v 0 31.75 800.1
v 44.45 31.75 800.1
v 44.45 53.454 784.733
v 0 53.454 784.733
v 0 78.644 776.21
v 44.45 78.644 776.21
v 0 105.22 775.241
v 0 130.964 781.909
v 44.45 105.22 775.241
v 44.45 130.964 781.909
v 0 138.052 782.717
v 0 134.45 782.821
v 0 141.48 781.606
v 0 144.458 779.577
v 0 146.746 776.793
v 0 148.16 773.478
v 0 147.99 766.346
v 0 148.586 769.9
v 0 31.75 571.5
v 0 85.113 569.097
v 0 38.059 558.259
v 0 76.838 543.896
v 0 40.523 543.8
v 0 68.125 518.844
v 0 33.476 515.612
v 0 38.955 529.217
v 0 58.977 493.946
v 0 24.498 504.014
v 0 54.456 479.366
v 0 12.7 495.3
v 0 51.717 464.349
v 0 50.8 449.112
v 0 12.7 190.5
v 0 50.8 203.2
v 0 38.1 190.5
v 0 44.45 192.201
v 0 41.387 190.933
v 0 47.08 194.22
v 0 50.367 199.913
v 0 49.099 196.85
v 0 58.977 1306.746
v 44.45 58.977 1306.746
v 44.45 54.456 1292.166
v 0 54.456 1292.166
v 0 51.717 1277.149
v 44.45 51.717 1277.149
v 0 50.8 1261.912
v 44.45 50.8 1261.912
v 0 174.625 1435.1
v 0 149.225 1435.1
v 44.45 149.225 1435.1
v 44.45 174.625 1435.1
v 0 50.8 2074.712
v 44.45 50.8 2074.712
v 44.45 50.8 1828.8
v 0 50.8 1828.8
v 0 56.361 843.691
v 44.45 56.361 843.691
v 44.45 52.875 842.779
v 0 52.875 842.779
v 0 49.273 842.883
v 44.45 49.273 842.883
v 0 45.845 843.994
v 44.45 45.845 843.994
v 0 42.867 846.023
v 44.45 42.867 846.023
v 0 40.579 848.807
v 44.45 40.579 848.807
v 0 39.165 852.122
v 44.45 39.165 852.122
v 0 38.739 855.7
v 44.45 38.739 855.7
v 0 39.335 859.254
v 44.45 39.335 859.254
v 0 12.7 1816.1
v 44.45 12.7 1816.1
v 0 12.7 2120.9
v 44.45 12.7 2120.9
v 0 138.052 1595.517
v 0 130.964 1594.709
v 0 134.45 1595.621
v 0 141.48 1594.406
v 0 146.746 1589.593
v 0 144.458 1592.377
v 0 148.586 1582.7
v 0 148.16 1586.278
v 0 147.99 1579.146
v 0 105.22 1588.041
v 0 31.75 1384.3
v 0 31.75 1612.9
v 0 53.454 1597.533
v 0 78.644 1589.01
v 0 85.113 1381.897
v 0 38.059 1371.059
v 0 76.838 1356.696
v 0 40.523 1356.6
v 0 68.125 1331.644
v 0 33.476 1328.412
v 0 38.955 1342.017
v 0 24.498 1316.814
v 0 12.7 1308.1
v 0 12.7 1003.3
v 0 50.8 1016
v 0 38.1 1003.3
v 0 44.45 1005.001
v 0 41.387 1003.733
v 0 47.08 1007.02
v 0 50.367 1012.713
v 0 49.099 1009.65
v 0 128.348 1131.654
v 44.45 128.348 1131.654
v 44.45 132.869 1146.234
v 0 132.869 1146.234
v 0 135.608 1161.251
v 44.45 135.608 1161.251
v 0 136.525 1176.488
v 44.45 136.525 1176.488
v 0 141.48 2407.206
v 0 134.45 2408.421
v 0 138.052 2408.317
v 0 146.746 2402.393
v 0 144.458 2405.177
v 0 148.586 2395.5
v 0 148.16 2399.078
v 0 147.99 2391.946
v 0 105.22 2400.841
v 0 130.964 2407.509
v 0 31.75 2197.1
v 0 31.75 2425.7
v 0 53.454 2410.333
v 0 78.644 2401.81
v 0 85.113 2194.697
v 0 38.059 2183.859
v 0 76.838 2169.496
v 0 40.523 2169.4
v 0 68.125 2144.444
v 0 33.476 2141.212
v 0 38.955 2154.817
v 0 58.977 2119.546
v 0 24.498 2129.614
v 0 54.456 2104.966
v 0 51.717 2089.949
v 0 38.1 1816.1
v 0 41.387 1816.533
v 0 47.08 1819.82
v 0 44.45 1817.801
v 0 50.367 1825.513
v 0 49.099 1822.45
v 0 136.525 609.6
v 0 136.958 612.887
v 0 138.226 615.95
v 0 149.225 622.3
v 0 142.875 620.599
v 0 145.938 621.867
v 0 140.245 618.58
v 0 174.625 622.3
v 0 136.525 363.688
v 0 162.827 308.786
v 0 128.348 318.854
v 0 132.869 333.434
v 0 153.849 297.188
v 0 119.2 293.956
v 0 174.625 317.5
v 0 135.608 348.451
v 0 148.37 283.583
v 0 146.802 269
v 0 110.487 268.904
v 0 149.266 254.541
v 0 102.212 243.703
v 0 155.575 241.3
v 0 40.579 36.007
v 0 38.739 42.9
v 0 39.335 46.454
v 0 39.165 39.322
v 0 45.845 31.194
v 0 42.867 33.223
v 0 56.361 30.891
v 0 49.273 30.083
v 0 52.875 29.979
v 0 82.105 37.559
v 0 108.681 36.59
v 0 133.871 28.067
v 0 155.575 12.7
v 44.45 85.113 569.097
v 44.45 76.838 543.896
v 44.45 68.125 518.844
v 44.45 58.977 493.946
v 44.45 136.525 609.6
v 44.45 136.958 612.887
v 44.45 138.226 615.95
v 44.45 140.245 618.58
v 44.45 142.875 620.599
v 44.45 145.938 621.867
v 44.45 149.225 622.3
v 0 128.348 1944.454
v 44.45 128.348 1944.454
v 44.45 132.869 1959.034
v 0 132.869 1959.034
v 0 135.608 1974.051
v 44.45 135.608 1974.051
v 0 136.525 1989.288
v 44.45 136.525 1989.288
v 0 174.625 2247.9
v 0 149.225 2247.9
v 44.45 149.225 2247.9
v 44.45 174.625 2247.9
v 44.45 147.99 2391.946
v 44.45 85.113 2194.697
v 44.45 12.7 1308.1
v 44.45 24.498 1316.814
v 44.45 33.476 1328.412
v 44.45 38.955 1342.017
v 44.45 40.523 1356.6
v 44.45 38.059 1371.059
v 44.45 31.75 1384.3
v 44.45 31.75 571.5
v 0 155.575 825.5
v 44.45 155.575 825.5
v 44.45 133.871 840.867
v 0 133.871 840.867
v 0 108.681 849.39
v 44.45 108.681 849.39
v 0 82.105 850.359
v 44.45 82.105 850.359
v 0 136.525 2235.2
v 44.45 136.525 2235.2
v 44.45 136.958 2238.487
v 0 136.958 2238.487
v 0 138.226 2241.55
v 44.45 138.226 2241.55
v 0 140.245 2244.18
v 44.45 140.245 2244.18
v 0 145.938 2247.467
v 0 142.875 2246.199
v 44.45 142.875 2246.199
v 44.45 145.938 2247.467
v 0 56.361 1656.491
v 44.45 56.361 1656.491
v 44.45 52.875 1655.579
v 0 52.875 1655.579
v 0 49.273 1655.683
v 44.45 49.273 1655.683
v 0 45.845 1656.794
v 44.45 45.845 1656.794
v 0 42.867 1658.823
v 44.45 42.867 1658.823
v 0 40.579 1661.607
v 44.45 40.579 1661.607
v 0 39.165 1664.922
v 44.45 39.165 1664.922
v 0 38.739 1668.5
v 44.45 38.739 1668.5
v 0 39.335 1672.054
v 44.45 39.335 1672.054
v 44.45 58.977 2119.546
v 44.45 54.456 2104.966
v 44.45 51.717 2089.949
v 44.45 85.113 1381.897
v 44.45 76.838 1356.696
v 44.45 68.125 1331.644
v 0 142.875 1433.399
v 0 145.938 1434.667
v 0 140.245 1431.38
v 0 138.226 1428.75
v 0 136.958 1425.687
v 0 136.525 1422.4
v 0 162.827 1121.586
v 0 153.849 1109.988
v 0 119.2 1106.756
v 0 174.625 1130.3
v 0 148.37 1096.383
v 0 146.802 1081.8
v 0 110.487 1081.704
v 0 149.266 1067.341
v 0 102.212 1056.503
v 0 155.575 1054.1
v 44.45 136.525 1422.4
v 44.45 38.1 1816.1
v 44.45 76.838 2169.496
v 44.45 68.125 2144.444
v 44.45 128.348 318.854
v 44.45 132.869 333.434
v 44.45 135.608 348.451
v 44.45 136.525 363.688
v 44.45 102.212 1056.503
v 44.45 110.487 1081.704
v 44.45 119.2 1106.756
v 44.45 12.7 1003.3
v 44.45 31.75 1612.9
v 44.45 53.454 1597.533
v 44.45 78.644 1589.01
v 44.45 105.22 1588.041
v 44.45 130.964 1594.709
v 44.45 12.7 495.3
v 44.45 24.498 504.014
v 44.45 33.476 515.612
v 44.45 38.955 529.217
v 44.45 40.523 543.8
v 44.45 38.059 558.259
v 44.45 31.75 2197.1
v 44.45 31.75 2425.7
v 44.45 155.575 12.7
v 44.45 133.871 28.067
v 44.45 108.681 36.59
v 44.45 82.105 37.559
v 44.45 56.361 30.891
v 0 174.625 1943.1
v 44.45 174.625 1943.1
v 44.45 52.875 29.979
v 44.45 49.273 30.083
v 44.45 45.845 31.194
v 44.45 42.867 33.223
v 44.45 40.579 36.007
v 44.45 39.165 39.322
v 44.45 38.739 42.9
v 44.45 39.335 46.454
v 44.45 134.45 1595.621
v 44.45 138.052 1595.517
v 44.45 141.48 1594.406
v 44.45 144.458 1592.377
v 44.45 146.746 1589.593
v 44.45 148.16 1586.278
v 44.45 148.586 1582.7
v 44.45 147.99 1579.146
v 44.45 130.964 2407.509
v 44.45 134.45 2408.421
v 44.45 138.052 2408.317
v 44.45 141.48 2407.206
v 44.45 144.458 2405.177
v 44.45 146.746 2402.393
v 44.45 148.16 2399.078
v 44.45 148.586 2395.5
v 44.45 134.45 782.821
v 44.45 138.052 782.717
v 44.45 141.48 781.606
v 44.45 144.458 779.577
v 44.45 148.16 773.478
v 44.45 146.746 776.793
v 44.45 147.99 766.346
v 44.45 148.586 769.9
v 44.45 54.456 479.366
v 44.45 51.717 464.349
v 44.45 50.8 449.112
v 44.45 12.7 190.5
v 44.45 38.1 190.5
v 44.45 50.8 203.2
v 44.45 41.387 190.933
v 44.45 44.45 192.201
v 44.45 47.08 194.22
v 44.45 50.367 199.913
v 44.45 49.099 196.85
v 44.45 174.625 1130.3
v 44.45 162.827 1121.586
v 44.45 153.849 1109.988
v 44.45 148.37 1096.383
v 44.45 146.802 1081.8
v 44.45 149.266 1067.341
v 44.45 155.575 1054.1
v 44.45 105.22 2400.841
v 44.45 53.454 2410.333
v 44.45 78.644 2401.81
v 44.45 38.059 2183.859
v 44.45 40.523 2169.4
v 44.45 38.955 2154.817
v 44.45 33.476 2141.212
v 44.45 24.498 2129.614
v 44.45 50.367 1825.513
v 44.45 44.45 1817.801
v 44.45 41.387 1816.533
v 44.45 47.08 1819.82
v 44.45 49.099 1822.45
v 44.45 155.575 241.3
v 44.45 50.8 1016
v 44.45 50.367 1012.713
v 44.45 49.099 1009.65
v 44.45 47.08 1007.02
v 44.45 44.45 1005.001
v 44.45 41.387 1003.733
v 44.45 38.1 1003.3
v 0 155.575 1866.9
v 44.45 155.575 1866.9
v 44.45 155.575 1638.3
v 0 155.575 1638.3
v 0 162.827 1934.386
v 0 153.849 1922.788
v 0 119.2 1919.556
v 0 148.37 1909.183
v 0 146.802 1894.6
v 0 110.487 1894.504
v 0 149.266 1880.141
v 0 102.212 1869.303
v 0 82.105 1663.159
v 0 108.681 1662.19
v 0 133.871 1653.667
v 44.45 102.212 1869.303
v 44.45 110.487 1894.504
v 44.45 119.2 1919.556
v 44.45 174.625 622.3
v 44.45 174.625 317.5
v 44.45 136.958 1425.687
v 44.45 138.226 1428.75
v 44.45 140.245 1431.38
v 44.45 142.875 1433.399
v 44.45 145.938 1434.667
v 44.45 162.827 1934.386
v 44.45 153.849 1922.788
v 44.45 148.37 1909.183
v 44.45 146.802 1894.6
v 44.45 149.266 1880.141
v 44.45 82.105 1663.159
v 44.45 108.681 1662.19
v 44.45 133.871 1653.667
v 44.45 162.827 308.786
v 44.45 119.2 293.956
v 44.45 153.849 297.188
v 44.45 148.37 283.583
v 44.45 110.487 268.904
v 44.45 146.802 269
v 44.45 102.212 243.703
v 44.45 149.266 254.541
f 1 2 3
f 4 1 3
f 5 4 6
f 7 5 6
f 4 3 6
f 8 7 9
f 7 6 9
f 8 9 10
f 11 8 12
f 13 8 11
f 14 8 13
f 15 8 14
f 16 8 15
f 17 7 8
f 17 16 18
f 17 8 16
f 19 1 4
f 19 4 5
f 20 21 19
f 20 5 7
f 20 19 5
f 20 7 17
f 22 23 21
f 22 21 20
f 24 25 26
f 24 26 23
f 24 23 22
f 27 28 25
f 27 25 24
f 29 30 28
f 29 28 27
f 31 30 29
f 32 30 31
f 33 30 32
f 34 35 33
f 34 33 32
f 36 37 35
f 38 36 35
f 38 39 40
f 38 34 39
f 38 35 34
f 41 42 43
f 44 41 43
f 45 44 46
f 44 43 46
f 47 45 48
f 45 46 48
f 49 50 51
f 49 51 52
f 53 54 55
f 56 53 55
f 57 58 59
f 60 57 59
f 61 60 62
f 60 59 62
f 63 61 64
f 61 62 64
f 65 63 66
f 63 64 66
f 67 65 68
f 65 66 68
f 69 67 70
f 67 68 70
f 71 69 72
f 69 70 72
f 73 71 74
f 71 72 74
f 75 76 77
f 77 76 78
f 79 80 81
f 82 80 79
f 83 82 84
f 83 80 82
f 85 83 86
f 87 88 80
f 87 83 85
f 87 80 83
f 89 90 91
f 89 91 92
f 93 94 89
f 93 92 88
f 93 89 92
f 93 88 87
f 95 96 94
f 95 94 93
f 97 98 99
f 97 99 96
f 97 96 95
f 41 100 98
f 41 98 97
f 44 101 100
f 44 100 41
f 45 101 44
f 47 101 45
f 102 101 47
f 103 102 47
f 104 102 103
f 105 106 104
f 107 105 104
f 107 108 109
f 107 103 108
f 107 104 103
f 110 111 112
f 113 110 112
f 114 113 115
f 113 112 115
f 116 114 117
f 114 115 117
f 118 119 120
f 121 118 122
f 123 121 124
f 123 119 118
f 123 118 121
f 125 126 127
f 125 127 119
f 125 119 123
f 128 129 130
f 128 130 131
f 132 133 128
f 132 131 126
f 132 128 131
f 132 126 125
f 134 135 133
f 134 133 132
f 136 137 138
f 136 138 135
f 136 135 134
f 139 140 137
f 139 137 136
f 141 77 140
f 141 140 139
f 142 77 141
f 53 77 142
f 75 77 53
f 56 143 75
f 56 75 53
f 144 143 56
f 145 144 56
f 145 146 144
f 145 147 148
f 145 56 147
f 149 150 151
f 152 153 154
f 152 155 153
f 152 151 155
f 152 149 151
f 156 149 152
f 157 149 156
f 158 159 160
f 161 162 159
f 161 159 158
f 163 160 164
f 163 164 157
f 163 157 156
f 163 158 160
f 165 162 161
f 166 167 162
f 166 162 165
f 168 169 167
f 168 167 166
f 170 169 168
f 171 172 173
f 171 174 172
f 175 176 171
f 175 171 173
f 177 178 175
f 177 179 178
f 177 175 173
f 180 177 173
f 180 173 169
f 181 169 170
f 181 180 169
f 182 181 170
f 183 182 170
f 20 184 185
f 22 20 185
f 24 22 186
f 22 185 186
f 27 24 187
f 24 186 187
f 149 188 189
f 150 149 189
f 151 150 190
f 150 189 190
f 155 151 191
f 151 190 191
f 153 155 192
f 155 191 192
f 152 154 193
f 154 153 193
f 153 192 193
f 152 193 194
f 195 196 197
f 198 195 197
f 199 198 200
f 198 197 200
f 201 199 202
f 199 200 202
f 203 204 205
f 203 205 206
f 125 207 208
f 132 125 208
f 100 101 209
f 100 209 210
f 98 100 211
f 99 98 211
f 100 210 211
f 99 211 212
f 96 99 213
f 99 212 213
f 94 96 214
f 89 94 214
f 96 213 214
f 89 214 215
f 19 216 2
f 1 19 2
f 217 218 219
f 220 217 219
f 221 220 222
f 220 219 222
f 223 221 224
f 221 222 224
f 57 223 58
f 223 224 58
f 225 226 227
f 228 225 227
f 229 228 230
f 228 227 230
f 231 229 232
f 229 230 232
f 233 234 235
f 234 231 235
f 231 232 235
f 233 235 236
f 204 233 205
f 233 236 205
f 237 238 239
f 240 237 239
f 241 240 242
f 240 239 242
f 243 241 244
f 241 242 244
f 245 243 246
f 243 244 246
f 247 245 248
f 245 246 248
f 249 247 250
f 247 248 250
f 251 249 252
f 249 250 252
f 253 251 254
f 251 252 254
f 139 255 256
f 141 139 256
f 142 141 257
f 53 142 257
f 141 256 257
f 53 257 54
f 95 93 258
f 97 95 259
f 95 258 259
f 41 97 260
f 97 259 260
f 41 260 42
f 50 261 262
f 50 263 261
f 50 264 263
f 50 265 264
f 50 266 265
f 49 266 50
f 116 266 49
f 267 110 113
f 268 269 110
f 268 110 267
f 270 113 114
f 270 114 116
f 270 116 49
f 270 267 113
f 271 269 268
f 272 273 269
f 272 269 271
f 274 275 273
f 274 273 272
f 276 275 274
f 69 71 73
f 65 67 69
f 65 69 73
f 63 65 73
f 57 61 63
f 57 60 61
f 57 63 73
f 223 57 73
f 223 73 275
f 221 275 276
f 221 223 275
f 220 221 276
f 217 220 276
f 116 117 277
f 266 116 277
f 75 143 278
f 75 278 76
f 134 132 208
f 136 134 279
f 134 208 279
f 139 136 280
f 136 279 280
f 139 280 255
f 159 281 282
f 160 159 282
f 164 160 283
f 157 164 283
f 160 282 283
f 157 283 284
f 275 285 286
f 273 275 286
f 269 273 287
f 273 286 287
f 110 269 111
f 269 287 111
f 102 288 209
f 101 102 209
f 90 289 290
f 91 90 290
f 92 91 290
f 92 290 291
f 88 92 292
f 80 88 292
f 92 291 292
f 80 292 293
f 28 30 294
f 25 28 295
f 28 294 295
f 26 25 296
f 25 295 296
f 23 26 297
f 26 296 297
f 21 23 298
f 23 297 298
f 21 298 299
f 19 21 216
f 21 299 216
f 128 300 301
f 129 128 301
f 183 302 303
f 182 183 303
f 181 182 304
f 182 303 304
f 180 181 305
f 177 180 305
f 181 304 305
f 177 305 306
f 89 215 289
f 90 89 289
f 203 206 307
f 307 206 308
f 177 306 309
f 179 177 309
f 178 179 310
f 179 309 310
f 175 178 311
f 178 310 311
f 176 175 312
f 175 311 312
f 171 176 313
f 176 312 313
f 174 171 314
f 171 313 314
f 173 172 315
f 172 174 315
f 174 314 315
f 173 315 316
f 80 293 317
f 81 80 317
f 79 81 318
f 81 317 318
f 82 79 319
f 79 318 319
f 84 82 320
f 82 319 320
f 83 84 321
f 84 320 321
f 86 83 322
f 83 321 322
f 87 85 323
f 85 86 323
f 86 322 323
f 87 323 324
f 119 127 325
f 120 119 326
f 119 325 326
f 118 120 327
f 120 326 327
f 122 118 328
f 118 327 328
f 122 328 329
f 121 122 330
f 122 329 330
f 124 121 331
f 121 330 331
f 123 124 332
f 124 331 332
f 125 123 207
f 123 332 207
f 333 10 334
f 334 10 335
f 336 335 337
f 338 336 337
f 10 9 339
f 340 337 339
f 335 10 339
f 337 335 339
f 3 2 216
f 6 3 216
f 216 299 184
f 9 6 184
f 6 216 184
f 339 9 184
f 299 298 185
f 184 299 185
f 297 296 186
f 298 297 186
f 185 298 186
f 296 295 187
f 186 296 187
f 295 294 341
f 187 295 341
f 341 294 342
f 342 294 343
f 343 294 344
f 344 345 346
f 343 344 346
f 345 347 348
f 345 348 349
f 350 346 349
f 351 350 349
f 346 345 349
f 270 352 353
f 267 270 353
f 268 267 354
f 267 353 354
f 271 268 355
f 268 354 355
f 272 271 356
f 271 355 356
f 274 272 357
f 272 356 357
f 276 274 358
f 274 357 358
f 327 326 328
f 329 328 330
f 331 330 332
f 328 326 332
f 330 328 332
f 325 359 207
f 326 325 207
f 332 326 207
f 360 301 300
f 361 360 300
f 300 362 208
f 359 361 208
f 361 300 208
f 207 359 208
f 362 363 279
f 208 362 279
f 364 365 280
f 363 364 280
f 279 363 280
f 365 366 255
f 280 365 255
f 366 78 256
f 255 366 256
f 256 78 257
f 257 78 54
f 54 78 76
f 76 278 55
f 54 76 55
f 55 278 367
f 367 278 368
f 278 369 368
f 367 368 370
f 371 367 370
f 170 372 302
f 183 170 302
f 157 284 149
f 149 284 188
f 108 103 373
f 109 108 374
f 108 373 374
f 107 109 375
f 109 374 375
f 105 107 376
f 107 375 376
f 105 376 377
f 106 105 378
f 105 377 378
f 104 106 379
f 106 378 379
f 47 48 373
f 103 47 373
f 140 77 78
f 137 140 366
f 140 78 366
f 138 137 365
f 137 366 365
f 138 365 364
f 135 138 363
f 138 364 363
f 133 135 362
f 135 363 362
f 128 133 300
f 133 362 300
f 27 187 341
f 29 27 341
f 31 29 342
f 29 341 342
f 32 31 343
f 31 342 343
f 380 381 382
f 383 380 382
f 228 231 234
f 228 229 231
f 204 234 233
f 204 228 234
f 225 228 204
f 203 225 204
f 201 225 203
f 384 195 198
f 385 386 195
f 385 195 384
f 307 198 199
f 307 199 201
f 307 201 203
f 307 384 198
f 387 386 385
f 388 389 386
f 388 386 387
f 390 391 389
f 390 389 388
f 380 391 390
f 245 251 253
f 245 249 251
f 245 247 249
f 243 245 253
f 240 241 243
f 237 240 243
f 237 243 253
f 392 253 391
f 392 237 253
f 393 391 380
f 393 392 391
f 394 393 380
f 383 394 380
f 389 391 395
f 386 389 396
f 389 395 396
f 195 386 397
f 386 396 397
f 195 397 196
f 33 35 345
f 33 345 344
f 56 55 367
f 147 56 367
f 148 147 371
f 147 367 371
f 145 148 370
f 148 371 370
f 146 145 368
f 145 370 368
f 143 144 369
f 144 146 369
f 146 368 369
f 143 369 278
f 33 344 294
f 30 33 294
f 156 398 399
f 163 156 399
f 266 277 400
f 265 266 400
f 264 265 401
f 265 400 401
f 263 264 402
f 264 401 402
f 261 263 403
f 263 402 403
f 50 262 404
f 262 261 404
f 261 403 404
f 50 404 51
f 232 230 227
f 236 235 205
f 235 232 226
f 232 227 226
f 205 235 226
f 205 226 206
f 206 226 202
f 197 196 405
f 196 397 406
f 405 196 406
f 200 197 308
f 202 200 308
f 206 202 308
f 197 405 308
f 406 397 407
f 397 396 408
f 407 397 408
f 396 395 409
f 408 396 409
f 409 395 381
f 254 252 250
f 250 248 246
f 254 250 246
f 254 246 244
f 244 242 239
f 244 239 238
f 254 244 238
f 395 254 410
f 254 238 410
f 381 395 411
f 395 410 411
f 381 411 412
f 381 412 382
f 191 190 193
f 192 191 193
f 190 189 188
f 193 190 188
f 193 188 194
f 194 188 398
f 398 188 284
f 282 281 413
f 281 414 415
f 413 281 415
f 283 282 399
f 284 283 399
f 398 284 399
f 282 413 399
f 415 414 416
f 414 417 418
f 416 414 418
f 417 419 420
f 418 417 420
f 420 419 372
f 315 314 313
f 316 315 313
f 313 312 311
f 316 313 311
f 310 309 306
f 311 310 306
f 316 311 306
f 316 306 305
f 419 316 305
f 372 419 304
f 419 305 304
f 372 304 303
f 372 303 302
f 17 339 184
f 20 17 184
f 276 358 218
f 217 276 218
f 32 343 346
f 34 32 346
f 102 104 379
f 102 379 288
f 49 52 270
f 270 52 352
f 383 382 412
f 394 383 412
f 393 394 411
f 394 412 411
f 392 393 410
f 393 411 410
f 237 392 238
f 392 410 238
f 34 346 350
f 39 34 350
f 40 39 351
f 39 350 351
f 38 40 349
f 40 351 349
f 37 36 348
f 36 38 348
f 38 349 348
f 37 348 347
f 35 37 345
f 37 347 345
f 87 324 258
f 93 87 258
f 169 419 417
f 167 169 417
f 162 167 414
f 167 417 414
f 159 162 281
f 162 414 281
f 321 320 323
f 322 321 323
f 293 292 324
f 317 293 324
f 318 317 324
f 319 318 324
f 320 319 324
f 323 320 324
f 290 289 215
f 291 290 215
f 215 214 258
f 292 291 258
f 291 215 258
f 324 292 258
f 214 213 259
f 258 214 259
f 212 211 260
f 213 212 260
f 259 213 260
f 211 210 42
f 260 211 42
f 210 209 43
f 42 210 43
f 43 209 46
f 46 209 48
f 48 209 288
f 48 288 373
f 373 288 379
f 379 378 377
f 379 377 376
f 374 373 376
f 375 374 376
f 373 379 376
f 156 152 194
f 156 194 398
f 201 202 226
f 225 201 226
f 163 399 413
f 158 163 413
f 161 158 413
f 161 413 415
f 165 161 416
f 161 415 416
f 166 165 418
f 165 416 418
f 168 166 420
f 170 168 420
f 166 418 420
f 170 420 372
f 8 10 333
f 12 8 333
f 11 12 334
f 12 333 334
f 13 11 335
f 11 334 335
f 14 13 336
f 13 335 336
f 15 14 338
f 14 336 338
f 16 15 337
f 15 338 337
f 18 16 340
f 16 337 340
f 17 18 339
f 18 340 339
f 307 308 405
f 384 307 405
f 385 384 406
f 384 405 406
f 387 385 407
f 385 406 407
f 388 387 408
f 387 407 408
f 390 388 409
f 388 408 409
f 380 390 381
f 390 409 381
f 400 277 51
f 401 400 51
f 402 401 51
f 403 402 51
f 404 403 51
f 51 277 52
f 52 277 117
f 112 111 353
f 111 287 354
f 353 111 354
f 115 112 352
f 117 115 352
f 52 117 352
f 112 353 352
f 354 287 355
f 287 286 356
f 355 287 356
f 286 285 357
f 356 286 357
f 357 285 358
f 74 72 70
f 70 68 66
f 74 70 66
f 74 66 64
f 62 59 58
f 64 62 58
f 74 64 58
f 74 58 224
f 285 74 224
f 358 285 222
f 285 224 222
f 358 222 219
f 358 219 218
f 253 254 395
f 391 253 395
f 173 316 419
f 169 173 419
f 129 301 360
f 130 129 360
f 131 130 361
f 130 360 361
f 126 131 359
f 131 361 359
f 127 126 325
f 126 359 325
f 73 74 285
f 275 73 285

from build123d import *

# Parameters (mm, degrees)
F0_W     = 44.45
F0_H     = 184.15
F1_DEPTH = 2438.4
F2_W     = 184.15
F2_H     = 2438.4
F3_DEPTH = 44.451


with BuildPart() as f1:
    # F0 (on Top) → F1 (new body)
    with BuildSketch(Plane.XY):
        with Locations((22.225, 92.075)):
            Rectangle(F0_W, F0_H)
    extrude(amount=F1_DEPTH)

    # F2 (on face) → F3 (cut, through all)
    with BuildSketch(Plane.YZ.offset(44.45)):
        with Locations((92.075, 1219.2)):
            Rectangle(F2_W, F2_H)
        with BuildLine():
            Line((50.8, 449.111792), (50.8, 203.2))
            ThreePointArc((50.8, 203.2), (47.080256, 194.219744), (38.1, 190.5))
            Line((38.1, 190.5), (12.7, 190.5))
            Line((12.7, 190.5), (12.7, 495.3))
            ThreePointArc((12.7, 495.3), (38.955498, 529.217376), (31.75, 571.5))
            Line((31.75, 571.5), (31.75, 800.1))
            ThreePointArc((31.75, 800.1), (78.644314, 776.209793), (130.963939, 781.908516))
            ThreePointArc((130.963939, 781.908516), (144.458401, 779.576827), (147.990097, 766.345637))
            Line((147.990097, 766.345637), (85.113103, 569.097312))
            ThreePointArc((85.113103, 569.097312), (72.5356, 531.351046), (58.977038, 493.945971))
            ThreePointArc((58.977038, 493.945971), (52.860982, 471.898672), (50.8, 449.111792))
        make_face(mode=Mode.SUBTRACT)
        with BuildLine():
            Line((149.225, 622.3), (174.625, 622.3))
            Line((174.625, 622.3), (174.625, 317.5))
            ThreePointArc((174.625, 317.5), (148.369502, 283.582624), (155.575, 241.3))
            Line((155.575, 241.3), (155.575, 12.7))
            ThreePointArc((155.575, 12.7), (108.680686, 36.590207), (56.361061, 30.891484))
            ThreePointArc((56.361061, 30.891484), (42.866599, 33.223173), (39.334903, 46.454363))
            Line((39.334903, 46.454363), (102.211897, 243.702688))
            ThreePointArc((102.211897, 243.702688), (114.7894, 281.448954), (128.347962, 318.854029))
            ThreePointArc((128.347962, 318.854029), (134.464018, 340.901328), (136.525, 363.688208))
            Line((136.525, 363.688208), (136.525, 609.6))
            ThreePointArc((136.525, 609.6), (140.244744, 618.580256), (149.225, 622.3))
        make_face(mode=Mode.SUBTRACT)
        with BuildLine():
            Line((136.525, 1176.488208), (136.525, 1422.4))
            ThreePointArc((136.525, 1422.4), (140.244744, 1431.380256), (149.225, 1435.1))
            Line((149.225, 1435.1), (174.625, 1435.1))
            Line((174.625, 1435.1), (174.625, 1130.3))
            ThreePointArc((174.625, 1130.3), (148.369502, 1096.382624), (155.575, 1054.1))
            Line((155.575, 1054.1), (155.575, 825.5))
            ThreePointArc((155.575, 825.5), (108.680686, 849.390207), (56.361061, 843.691484))
            ThreePointArc((56.361061, 843.691484), (42.866599, 846.023173), (39.334903, 859.254363))
            Line((39.334903, 859.254363), (102.211897, 1056.502688))
            ThreePointArc((102.211897, 1056.502688), (114.7894, 1094.248954), (128.347962, 1131.654029))
            ThreePointArc((128.347962, 1131.654029), (134.464018, 1153.701328), (136.525, 1176.488208))
        make_face(mode=Mode.SUBTRACT)
        with BuildLine():
            Line((50.8, 1261.911792), (50.8, 1016))
            ThreePointArc((50.8, 1016), (47.080256, 1007.019744), (38.1, 1003.3))
            Line((38.1, 1003.3), (12.7, 1003.3))
            Line((12.7, 1003.3), (12.7, 1308.1))
            ThreePointArc((12.7, 1308.1), (38.955498, 1342.017376), (31.75, 1384.3))
            Line((31.75, 1384.3), (31.75, 1612.9))
            ThreePointArc((31.75, 1612.9), (78.644314, 1589.009793), (130.963939, 1594.708516))
            ThreePointArc((130.963939, 1594.708516), (144.458401, 1592.376827), (147.990097, 1579.145637))
            Line((147.990097, 1579.145637), (85.113103, 1381.897312))
            ThreePointArc((85.113103, 1381.897312), (72.5356, 1344.151046), (58.977038, 1306.745971))
            ThreePointArc((58.977038, 1306.745971), (52.860982, 1284.698672), (50.8, 1261.911792))
        make_face(mode=Mode.SUBTRACT)
        with BuildLine():
            Line((38.1, 1816.1), (12.7, 1816.1))
            Line((12.7, 1816.1), (12.7, 2120.9))
            ThreePointArc((12.7, 2120.9), (38.955498, 2154.817376), (31.75, 2197.1))
            Line((31.75, 2197.1), (31.75, 2425.7))
            ThreePointArc((31.75, 2425.7), (78.644314, 2401.809793), (130.963939, 2407.508516))
            ThreePointArc((130.963939, 2407.508516), (144.458401, 2405.176827), (147.990097, 2391.945637))
            Line((147.990097, 2391.945637), (85.113103, 2194.697312))
            ThreePointArc((85.113103, 2194.697312), (72.5356, 2156.951046), (58.977038, 2119.545971))
            ThreePointArc((58.977038, 2119.545971), (52.860982, 2097.498672), (50.8, 2074.711792))
            Line((50.8, 2074.711792), (50.8, 1828.8))
            ThreePointArc((50.8, 1828.8), (47.080256, 1819.819744), (38.1, 1816.1))
        make_face(mode=Mode.SUBTRACT)
        with BuildLine():
            Line((149.225, 2247.9), (174.625, 2247.9))
            Line((174.625, 2247.9), (174.625, 1943.1))
            ThreePointArc((174.625, 1943.1), (148.369502, 1909.182624), (155.575, 1866.9))
            Line((155.575, 1866.9), (155.575, 1638.3))
            ThreePointArc((155.575, 1638.3), (108.680686, 1662.190207), (56.361061, 1656.491484))
            ThreePointArc((56.361061, 1656.491484), (42.866599, 1658.823173), (39.334903, 1672.054363))
            Line((39.334903, 1672.054363), (102.211897, 1869.302688))
            ThreePointArc((102.211897, 1869.302688), (114.7894, 1907.048954), (128.347962, 1944.454029))
            ThreePointArc((128.347962, 1944.454029), (134.464018, 1966.501328), (136.525, 1989.288208))
            Line((136.525, 1989.288208), (136.525, 2235.2))
            ThreePointArc((136.525, 2235.2), (140.244744, 2244.180256), (149.225, 2247.9))
        make_face(mode=Mode.SUBTRACT)
    extrude(amount=-F3_DEPTH, mode=Mode.SUBTRACT)


solid = f1.part
